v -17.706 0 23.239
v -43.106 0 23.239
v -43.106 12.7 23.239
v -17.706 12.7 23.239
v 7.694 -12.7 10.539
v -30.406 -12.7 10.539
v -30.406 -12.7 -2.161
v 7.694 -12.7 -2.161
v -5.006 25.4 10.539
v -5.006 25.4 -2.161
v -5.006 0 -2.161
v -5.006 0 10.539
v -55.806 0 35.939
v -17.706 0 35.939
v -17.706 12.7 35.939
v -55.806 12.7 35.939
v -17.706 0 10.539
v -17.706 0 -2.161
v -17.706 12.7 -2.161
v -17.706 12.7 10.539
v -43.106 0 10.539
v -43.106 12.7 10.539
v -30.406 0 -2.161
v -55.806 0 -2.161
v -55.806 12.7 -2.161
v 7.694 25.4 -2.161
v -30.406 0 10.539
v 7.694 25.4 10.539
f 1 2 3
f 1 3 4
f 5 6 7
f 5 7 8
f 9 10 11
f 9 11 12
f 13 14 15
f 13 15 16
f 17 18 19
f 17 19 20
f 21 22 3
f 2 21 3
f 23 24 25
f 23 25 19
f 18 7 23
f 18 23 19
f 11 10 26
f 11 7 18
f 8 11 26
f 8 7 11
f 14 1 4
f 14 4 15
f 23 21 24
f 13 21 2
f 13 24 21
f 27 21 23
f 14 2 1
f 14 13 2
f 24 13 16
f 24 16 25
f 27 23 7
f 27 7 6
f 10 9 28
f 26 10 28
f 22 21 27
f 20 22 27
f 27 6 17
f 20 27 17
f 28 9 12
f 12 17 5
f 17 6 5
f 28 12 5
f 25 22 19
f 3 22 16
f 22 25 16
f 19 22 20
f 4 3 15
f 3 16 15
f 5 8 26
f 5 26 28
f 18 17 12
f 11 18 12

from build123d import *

# Parameters (mm, degrees)
F0_W     = 12.7
F0_H     = 12.7
F1_DEPTH = 12.7
F2_DEPTH = 12.7
F3_DEPTH = 25.4


with BuildPart() as f1:
    # F0 (on Front) → F1 (new body)
    with BuildSketch(Plane.XZ):
        with Locations((-11.356164, 4.188791)):
            Rectangle(F0_W, F0_H)
        with Locations((-24.056164, 4.188791)):
            Rectangle(F0_W, F0_H)
        with Locations((1.343836, 4.188791)):
            Rectangle(F0_W, F0_H)
    extrude(amount=F1_DEPTH)

    # F0 (on Front) → F2 (join)
    with BuildSketch(Plane.XZ):
        with Locations((-24.056164, 4.188791)):
            Rectangle(F0_W, F0_H)
        with Locations((-36.756164, 4.188791)):
            Rectangle(F0_W, F0_H)
        with Locations((-49.456164, 4.188791)):
            Rectangle(F0_W, F0_H)
        with Locations((-49.456164, 16.888791)):
            Rectangle(F0_W, F0_H)
        with Locations((-49.456164, 29.588791)):
            Rectangle(F0_W, F0_H)
        with Locations((-36.756164, 29.588791)):
            Rectangle(F0_W, F0_H)
        with Locations((-24.056164, 29.588791)):
            Rectangle(F0_W, F0_H)
    extrude(amount=-F2_DEPTH)

    # F0 (on Front) → F3 (join)
    with BuildSketch(Plane.XZ):
        with Locations((1.343836, 4.188791)):
            Rectangle(F0_W, F0_H)
    extrude(amount=-F3_DEPTH)


solid = f1.part
